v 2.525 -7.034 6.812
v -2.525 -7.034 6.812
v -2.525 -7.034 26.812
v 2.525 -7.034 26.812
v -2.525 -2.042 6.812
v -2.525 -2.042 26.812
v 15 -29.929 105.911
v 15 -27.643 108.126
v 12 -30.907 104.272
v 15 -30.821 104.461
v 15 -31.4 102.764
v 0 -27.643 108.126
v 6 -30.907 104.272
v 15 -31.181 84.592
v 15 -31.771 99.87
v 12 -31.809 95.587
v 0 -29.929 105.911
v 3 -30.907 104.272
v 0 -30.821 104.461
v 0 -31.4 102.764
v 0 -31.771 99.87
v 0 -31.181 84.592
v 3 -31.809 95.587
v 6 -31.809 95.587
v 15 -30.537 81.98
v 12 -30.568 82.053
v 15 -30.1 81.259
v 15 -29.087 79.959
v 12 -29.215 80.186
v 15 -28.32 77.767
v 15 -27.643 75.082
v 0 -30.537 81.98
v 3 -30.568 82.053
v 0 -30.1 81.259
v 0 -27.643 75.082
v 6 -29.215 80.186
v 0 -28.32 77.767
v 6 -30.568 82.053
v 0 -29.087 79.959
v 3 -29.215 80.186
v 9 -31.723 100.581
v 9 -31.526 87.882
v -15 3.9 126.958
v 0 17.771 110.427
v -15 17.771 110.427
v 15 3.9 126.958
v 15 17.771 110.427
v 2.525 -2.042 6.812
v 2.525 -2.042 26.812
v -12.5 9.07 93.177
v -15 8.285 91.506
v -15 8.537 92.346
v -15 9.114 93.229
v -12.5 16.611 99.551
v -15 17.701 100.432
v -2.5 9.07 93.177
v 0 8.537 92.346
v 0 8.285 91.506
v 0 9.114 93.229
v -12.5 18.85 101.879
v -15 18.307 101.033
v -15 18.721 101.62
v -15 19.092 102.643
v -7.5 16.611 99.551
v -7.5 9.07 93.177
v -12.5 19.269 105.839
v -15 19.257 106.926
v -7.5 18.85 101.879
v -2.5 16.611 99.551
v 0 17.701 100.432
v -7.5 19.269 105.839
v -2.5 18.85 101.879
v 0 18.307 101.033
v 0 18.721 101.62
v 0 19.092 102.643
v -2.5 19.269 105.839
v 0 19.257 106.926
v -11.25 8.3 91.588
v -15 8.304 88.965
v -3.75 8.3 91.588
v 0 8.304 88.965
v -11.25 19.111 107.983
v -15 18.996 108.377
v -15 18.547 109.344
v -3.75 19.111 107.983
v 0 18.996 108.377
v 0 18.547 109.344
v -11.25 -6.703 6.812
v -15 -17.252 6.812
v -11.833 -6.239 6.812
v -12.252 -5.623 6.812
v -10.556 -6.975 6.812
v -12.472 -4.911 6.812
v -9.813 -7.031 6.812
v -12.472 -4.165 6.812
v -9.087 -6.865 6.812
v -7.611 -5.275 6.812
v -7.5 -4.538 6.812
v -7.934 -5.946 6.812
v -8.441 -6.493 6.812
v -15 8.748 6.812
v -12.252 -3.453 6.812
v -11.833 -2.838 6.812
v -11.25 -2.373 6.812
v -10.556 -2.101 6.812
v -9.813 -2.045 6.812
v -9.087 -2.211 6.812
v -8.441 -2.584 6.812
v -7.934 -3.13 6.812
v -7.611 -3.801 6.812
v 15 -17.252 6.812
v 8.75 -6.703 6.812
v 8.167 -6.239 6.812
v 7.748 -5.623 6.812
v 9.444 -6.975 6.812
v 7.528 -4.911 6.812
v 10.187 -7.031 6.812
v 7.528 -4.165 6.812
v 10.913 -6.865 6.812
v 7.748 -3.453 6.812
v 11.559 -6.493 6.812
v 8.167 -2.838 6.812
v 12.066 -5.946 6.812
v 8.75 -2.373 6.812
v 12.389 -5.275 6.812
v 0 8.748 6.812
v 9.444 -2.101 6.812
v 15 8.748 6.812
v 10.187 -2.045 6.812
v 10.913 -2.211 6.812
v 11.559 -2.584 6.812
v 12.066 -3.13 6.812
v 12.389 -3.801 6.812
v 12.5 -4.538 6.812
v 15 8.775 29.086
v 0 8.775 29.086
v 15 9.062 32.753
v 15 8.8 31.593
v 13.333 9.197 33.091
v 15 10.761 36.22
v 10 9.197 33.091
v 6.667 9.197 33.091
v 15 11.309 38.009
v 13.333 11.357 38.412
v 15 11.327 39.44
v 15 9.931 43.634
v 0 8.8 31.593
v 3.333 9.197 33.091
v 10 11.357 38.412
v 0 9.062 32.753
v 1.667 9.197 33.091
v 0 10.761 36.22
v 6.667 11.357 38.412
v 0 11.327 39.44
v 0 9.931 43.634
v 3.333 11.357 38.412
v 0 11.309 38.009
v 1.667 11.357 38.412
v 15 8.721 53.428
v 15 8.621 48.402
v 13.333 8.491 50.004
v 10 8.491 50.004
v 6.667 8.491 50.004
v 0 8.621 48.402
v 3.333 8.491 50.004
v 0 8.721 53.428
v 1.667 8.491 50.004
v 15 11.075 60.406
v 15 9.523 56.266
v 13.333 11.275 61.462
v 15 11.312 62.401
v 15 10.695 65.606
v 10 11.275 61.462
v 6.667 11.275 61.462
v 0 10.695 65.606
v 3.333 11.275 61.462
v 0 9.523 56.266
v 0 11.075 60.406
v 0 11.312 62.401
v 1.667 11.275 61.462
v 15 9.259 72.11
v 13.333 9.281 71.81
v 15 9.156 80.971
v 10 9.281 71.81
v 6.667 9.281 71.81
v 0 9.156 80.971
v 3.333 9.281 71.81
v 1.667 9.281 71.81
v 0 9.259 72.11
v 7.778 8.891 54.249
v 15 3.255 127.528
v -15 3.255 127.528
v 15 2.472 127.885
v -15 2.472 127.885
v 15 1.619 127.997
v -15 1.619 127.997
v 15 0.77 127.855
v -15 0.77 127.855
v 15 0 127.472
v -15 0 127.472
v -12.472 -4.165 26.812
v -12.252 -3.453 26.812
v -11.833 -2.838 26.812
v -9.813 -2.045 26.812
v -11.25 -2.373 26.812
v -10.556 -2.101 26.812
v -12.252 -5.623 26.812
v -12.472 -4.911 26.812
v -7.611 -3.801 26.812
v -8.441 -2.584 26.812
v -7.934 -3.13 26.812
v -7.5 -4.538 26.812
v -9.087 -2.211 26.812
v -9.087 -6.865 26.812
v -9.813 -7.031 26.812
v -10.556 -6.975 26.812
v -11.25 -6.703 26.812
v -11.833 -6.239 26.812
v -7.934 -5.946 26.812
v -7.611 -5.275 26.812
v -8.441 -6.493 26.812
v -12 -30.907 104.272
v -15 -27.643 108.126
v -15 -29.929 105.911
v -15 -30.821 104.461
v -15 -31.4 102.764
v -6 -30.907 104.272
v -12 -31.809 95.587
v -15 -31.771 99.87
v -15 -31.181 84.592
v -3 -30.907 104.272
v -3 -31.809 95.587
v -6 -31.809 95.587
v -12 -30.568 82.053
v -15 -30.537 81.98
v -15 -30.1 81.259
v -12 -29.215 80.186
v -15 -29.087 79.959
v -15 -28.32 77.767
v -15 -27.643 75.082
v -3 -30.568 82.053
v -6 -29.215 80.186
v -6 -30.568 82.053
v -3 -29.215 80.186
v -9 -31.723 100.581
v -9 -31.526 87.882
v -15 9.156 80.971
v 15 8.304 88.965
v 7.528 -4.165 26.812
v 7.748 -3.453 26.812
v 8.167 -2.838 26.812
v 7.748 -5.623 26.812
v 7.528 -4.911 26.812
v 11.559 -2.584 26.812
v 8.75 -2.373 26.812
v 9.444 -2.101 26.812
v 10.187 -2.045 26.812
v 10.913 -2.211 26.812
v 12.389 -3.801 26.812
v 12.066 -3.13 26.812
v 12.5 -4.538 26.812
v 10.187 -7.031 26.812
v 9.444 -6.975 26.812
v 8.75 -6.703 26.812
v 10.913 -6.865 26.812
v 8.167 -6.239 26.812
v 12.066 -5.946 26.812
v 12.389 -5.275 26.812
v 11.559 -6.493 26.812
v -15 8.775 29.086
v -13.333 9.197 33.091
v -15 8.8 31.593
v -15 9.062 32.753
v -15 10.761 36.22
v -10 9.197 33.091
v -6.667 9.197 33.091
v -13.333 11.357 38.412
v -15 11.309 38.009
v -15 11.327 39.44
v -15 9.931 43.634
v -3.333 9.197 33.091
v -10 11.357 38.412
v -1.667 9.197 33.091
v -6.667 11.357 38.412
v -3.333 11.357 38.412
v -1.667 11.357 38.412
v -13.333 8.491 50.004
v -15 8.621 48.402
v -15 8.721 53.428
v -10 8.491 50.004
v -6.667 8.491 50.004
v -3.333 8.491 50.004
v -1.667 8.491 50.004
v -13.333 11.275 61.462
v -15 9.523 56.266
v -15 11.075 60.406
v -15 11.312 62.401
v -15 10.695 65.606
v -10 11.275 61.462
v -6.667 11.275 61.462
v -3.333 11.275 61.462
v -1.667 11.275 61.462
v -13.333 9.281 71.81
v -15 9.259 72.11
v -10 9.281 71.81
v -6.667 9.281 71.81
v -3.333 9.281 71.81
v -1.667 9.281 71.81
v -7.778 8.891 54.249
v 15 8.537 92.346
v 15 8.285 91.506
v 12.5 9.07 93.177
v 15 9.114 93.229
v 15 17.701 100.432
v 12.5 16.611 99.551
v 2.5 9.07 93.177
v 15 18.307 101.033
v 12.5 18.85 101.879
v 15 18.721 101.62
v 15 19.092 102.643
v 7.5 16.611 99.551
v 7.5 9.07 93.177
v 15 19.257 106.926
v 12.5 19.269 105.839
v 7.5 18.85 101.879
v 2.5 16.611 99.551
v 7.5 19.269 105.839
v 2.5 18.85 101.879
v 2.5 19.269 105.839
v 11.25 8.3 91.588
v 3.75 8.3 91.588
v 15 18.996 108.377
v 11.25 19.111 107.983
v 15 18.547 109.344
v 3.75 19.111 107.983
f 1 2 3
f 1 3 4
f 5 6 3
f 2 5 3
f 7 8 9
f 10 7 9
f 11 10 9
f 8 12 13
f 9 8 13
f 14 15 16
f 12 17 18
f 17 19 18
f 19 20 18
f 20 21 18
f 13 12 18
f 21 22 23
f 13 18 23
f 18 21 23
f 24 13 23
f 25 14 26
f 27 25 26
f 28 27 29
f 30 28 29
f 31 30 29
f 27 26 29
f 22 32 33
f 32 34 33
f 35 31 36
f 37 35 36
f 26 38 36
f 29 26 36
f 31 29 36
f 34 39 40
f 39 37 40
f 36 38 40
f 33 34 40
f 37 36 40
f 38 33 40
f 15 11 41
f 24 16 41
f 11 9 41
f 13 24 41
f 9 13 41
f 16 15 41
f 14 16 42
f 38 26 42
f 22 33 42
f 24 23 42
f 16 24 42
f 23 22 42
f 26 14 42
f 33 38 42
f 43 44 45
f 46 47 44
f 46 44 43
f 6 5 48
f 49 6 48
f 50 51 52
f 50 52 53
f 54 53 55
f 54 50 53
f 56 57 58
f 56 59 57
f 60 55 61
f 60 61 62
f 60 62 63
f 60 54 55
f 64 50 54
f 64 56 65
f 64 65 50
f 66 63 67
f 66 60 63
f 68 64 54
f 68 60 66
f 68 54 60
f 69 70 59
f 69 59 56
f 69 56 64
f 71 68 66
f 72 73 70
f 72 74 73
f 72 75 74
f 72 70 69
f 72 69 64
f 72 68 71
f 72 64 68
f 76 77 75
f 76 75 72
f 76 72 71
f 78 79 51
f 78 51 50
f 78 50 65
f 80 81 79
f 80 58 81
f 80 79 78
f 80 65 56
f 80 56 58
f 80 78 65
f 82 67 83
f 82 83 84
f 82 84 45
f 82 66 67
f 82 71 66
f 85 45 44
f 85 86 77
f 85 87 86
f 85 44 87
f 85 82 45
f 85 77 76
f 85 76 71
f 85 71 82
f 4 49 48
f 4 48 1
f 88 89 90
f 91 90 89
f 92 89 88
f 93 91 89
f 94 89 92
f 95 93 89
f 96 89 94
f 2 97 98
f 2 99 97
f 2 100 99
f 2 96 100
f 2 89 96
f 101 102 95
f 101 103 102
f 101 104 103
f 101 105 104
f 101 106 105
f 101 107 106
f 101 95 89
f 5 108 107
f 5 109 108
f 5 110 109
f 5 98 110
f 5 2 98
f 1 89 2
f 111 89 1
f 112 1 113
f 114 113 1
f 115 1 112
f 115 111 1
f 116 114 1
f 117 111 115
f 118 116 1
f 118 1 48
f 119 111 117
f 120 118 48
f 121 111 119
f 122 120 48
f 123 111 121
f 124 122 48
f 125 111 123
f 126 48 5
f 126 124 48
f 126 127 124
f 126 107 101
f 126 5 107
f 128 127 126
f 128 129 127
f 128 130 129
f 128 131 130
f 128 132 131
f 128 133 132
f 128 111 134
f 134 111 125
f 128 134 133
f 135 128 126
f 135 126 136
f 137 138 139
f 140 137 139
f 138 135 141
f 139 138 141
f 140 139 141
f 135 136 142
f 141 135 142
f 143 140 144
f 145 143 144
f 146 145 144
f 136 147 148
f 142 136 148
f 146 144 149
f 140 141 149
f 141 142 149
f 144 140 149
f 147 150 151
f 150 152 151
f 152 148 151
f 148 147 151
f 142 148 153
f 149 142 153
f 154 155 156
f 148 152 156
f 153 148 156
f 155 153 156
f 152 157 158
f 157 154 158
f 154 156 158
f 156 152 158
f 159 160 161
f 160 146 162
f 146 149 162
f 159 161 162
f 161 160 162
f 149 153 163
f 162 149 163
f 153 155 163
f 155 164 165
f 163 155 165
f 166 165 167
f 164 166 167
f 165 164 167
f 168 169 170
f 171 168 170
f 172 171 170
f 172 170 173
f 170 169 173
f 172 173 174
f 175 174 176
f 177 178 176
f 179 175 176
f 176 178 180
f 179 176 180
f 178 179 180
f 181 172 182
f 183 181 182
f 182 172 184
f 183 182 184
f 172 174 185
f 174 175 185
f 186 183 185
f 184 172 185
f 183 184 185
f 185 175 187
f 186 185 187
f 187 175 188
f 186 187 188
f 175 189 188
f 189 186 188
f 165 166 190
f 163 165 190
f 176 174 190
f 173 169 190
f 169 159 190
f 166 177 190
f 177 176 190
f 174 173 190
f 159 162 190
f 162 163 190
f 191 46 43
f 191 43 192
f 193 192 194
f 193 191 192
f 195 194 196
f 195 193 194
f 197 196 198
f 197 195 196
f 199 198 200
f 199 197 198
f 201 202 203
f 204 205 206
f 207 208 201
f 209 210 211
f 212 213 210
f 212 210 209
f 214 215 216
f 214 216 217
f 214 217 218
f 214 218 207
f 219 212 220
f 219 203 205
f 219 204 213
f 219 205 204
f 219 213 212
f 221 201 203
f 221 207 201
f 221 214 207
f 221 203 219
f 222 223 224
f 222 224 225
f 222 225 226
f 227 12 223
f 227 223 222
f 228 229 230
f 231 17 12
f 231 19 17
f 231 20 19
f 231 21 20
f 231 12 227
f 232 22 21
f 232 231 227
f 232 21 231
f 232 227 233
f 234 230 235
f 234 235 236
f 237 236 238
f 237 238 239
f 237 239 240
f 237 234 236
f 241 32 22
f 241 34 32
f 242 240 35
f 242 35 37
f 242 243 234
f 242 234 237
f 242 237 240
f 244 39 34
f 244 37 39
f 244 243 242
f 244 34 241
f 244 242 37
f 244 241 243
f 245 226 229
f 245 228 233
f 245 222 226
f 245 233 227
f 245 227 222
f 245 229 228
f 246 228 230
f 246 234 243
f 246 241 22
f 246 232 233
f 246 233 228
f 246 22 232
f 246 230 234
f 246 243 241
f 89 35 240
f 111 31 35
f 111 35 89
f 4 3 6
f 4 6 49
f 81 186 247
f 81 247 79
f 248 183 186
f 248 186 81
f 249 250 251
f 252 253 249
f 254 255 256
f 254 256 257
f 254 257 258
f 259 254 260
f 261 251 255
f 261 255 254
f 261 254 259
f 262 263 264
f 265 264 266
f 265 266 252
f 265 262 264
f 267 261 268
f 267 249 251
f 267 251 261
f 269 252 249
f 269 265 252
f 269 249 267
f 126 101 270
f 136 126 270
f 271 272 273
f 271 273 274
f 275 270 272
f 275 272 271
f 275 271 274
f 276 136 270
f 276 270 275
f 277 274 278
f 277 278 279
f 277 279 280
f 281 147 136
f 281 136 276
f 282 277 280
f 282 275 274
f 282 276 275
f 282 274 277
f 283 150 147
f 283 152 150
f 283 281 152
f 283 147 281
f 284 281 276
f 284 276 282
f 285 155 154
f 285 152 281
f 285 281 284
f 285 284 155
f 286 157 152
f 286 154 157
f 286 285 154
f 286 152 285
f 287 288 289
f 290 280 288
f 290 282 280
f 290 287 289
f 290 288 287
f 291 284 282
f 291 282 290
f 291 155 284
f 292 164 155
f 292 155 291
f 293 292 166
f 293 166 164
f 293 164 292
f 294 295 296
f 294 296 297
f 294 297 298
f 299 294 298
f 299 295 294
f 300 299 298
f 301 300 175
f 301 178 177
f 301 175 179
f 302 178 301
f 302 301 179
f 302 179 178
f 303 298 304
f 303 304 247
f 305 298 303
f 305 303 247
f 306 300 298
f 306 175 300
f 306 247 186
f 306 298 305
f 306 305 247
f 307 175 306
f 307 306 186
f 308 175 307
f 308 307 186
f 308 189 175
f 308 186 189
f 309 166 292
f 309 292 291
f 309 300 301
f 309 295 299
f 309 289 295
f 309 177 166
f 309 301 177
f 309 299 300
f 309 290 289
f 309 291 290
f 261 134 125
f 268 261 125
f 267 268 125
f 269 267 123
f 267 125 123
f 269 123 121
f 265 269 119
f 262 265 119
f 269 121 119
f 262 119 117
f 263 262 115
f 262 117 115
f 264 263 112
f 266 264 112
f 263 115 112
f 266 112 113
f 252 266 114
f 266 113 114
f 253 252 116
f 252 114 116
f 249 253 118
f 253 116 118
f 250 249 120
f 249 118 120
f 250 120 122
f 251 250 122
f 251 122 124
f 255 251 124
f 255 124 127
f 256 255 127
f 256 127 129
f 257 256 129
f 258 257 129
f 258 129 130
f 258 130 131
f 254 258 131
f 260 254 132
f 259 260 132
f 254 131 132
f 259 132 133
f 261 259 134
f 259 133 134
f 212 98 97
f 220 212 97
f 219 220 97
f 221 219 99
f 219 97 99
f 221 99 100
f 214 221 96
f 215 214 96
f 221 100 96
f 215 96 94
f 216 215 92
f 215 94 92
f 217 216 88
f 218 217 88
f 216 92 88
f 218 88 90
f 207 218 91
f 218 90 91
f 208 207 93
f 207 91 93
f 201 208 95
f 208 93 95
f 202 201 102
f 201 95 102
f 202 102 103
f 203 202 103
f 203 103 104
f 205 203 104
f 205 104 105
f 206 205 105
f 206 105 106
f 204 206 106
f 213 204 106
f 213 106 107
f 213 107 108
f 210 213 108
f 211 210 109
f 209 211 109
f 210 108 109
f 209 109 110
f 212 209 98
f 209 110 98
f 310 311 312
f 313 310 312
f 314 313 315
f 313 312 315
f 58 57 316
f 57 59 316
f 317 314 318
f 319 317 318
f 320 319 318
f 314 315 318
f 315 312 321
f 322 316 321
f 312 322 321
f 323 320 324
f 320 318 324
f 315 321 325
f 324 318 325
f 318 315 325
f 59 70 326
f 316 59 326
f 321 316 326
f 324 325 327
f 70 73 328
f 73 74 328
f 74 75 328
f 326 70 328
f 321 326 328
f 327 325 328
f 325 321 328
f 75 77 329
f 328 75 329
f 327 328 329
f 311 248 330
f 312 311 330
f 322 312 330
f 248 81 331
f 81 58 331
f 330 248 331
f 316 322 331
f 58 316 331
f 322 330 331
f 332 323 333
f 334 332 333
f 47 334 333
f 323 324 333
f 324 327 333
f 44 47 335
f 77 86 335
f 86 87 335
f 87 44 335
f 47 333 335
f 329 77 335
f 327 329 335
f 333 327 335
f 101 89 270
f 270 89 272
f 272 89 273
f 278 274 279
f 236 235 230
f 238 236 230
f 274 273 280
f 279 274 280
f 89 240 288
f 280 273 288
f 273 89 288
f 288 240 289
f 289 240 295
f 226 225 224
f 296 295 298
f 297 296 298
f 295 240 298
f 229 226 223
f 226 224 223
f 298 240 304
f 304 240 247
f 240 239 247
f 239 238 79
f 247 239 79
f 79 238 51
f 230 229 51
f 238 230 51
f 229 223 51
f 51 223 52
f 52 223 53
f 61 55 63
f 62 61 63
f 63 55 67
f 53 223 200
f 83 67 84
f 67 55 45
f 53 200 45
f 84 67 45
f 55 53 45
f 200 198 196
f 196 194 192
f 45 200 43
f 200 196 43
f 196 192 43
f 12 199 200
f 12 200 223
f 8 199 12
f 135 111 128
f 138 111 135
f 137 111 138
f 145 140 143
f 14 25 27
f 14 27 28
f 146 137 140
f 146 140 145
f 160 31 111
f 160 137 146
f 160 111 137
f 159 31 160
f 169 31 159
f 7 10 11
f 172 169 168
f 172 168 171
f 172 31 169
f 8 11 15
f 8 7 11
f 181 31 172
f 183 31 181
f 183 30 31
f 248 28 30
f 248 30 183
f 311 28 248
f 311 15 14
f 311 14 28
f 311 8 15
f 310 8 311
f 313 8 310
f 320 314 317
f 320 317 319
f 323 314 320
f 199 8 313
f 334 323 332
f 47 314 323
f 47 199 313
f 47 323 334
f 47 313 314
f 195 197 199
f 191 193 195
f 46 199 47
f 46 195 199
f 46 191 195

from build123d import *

# Parameters (mm, degrees)
F1_DEPTH = 15
F2_W     = 5.0492878072
F2_H     = 4.9923299812
F2_R     = 2.5
F3_DEPTH = 20


with BuildPart() as f1:
    # F0 (on Right) → F1 (new body, symmetric)
    with BuildSketch(Plane.YZ):
        with BuildLine():
            Line((17.7705745877, 110.4271839324), (3.899824656, 126.9576999954))
            ThreePointArc((3.899824656, 126.9576999954), (2.0498179474, 127.9727955751), (0, 127.4716067479))
            Line((0, 127.4716067479), (-27.6425841884, 108.1261329841))
            add(Edge.make_bspline(
                [(-27.6425841884, 108.1261329841), (-28.9962509323, 107.0866565511), (-31.7992237659, 104.2664438082), (-31.9080639512, 95.9882590359), (-31.4493353821, 81.6711189117), (-28.8420774778, 80.532352499), (-28.1375986662, 76.9869304037), (-27.6425841884, 75.0820216722)],
                knots=[0, 0, 0, 0, 0.1767007478, 0.4090371134, 0.6989083832, 0.8182877145, 1, 1, 1, 1], degree=3))
            Line((-27.6425841884, 75.0820216722), (-17.251973293, 6.8120841834))
            Line((-17.251973293, 6.8120841834), (8.748026707, 6.8120841834))
            add(Edge.make_bspline(
                [(8.748026707, 6.8120841834), (8.6435074998, 10.2266063309), (8.9399848315, 29.2950106099), (8.5672270256, 32.767771996), (12.7972055285, 38.664951647), (8.479561701, 45.3195845989), (8.086055896, 54.6828473515), (12.2336224479, 61.1806188569), (10.2049223998, 66.9712549262), (8.9520615942, 71.515792002), (9.1943721379, 78.7585189282), (9.1561711157, 80.9709361917)],
                knots=[0, 0, 0, 0, 0.1853938333, 0.2688775809, 0.3638921226, 0.4712269984, 0.5909985145, 0.6979790854, 0.7901867819, 0.8799887842, 1, 1, 1, 1], degree=3))
            Line((9.1561711157, 80.9709361917), (8.3037774262, 88.9653396656))
            add(Edge.make_bspline(
                [(8.3037774262, 88.9653396656), (8.0602352527, 91.296678043), (8.5197335757, 93.2102632027), (12.8916759154, 96.3017293717), (16.4697092795, 99.5509955673), (19.38213871, 101.5743928285), (19.2023801103, 106.1926312916), (19.345547908, 108.5502038197), (17.7705745877, 110.4271839324)],
                knots=[0, 0, 0, 0, 0.1654825166, 0.341763801, 0.5209258515, 0.6646539428, 0.8242767249, 1, 1, 1, 1], degree=3))
        make_face()
    extrude(amount=F1_DEPTH, both=True)

    # F2 (on face) → F3 (cut)
    with BuildSketch(Plane(origin=(0, 0, 6.8120841834), x_dir=(1, 0, 0), z_dir=(0, 0, -1))):
        with Locations((0, 4.5381011441)):
            Rectangle(F2_W, F2_H)
        with Locations((-10, 4.5381011441)):
            Circle(F2_R)
        with Locations((10, 4.5381011441)):
            Circle(F2_R)
    extrude(amount=-F3_DEPTH, mode=Mode.SUBTRACT)


solid = f1.part
